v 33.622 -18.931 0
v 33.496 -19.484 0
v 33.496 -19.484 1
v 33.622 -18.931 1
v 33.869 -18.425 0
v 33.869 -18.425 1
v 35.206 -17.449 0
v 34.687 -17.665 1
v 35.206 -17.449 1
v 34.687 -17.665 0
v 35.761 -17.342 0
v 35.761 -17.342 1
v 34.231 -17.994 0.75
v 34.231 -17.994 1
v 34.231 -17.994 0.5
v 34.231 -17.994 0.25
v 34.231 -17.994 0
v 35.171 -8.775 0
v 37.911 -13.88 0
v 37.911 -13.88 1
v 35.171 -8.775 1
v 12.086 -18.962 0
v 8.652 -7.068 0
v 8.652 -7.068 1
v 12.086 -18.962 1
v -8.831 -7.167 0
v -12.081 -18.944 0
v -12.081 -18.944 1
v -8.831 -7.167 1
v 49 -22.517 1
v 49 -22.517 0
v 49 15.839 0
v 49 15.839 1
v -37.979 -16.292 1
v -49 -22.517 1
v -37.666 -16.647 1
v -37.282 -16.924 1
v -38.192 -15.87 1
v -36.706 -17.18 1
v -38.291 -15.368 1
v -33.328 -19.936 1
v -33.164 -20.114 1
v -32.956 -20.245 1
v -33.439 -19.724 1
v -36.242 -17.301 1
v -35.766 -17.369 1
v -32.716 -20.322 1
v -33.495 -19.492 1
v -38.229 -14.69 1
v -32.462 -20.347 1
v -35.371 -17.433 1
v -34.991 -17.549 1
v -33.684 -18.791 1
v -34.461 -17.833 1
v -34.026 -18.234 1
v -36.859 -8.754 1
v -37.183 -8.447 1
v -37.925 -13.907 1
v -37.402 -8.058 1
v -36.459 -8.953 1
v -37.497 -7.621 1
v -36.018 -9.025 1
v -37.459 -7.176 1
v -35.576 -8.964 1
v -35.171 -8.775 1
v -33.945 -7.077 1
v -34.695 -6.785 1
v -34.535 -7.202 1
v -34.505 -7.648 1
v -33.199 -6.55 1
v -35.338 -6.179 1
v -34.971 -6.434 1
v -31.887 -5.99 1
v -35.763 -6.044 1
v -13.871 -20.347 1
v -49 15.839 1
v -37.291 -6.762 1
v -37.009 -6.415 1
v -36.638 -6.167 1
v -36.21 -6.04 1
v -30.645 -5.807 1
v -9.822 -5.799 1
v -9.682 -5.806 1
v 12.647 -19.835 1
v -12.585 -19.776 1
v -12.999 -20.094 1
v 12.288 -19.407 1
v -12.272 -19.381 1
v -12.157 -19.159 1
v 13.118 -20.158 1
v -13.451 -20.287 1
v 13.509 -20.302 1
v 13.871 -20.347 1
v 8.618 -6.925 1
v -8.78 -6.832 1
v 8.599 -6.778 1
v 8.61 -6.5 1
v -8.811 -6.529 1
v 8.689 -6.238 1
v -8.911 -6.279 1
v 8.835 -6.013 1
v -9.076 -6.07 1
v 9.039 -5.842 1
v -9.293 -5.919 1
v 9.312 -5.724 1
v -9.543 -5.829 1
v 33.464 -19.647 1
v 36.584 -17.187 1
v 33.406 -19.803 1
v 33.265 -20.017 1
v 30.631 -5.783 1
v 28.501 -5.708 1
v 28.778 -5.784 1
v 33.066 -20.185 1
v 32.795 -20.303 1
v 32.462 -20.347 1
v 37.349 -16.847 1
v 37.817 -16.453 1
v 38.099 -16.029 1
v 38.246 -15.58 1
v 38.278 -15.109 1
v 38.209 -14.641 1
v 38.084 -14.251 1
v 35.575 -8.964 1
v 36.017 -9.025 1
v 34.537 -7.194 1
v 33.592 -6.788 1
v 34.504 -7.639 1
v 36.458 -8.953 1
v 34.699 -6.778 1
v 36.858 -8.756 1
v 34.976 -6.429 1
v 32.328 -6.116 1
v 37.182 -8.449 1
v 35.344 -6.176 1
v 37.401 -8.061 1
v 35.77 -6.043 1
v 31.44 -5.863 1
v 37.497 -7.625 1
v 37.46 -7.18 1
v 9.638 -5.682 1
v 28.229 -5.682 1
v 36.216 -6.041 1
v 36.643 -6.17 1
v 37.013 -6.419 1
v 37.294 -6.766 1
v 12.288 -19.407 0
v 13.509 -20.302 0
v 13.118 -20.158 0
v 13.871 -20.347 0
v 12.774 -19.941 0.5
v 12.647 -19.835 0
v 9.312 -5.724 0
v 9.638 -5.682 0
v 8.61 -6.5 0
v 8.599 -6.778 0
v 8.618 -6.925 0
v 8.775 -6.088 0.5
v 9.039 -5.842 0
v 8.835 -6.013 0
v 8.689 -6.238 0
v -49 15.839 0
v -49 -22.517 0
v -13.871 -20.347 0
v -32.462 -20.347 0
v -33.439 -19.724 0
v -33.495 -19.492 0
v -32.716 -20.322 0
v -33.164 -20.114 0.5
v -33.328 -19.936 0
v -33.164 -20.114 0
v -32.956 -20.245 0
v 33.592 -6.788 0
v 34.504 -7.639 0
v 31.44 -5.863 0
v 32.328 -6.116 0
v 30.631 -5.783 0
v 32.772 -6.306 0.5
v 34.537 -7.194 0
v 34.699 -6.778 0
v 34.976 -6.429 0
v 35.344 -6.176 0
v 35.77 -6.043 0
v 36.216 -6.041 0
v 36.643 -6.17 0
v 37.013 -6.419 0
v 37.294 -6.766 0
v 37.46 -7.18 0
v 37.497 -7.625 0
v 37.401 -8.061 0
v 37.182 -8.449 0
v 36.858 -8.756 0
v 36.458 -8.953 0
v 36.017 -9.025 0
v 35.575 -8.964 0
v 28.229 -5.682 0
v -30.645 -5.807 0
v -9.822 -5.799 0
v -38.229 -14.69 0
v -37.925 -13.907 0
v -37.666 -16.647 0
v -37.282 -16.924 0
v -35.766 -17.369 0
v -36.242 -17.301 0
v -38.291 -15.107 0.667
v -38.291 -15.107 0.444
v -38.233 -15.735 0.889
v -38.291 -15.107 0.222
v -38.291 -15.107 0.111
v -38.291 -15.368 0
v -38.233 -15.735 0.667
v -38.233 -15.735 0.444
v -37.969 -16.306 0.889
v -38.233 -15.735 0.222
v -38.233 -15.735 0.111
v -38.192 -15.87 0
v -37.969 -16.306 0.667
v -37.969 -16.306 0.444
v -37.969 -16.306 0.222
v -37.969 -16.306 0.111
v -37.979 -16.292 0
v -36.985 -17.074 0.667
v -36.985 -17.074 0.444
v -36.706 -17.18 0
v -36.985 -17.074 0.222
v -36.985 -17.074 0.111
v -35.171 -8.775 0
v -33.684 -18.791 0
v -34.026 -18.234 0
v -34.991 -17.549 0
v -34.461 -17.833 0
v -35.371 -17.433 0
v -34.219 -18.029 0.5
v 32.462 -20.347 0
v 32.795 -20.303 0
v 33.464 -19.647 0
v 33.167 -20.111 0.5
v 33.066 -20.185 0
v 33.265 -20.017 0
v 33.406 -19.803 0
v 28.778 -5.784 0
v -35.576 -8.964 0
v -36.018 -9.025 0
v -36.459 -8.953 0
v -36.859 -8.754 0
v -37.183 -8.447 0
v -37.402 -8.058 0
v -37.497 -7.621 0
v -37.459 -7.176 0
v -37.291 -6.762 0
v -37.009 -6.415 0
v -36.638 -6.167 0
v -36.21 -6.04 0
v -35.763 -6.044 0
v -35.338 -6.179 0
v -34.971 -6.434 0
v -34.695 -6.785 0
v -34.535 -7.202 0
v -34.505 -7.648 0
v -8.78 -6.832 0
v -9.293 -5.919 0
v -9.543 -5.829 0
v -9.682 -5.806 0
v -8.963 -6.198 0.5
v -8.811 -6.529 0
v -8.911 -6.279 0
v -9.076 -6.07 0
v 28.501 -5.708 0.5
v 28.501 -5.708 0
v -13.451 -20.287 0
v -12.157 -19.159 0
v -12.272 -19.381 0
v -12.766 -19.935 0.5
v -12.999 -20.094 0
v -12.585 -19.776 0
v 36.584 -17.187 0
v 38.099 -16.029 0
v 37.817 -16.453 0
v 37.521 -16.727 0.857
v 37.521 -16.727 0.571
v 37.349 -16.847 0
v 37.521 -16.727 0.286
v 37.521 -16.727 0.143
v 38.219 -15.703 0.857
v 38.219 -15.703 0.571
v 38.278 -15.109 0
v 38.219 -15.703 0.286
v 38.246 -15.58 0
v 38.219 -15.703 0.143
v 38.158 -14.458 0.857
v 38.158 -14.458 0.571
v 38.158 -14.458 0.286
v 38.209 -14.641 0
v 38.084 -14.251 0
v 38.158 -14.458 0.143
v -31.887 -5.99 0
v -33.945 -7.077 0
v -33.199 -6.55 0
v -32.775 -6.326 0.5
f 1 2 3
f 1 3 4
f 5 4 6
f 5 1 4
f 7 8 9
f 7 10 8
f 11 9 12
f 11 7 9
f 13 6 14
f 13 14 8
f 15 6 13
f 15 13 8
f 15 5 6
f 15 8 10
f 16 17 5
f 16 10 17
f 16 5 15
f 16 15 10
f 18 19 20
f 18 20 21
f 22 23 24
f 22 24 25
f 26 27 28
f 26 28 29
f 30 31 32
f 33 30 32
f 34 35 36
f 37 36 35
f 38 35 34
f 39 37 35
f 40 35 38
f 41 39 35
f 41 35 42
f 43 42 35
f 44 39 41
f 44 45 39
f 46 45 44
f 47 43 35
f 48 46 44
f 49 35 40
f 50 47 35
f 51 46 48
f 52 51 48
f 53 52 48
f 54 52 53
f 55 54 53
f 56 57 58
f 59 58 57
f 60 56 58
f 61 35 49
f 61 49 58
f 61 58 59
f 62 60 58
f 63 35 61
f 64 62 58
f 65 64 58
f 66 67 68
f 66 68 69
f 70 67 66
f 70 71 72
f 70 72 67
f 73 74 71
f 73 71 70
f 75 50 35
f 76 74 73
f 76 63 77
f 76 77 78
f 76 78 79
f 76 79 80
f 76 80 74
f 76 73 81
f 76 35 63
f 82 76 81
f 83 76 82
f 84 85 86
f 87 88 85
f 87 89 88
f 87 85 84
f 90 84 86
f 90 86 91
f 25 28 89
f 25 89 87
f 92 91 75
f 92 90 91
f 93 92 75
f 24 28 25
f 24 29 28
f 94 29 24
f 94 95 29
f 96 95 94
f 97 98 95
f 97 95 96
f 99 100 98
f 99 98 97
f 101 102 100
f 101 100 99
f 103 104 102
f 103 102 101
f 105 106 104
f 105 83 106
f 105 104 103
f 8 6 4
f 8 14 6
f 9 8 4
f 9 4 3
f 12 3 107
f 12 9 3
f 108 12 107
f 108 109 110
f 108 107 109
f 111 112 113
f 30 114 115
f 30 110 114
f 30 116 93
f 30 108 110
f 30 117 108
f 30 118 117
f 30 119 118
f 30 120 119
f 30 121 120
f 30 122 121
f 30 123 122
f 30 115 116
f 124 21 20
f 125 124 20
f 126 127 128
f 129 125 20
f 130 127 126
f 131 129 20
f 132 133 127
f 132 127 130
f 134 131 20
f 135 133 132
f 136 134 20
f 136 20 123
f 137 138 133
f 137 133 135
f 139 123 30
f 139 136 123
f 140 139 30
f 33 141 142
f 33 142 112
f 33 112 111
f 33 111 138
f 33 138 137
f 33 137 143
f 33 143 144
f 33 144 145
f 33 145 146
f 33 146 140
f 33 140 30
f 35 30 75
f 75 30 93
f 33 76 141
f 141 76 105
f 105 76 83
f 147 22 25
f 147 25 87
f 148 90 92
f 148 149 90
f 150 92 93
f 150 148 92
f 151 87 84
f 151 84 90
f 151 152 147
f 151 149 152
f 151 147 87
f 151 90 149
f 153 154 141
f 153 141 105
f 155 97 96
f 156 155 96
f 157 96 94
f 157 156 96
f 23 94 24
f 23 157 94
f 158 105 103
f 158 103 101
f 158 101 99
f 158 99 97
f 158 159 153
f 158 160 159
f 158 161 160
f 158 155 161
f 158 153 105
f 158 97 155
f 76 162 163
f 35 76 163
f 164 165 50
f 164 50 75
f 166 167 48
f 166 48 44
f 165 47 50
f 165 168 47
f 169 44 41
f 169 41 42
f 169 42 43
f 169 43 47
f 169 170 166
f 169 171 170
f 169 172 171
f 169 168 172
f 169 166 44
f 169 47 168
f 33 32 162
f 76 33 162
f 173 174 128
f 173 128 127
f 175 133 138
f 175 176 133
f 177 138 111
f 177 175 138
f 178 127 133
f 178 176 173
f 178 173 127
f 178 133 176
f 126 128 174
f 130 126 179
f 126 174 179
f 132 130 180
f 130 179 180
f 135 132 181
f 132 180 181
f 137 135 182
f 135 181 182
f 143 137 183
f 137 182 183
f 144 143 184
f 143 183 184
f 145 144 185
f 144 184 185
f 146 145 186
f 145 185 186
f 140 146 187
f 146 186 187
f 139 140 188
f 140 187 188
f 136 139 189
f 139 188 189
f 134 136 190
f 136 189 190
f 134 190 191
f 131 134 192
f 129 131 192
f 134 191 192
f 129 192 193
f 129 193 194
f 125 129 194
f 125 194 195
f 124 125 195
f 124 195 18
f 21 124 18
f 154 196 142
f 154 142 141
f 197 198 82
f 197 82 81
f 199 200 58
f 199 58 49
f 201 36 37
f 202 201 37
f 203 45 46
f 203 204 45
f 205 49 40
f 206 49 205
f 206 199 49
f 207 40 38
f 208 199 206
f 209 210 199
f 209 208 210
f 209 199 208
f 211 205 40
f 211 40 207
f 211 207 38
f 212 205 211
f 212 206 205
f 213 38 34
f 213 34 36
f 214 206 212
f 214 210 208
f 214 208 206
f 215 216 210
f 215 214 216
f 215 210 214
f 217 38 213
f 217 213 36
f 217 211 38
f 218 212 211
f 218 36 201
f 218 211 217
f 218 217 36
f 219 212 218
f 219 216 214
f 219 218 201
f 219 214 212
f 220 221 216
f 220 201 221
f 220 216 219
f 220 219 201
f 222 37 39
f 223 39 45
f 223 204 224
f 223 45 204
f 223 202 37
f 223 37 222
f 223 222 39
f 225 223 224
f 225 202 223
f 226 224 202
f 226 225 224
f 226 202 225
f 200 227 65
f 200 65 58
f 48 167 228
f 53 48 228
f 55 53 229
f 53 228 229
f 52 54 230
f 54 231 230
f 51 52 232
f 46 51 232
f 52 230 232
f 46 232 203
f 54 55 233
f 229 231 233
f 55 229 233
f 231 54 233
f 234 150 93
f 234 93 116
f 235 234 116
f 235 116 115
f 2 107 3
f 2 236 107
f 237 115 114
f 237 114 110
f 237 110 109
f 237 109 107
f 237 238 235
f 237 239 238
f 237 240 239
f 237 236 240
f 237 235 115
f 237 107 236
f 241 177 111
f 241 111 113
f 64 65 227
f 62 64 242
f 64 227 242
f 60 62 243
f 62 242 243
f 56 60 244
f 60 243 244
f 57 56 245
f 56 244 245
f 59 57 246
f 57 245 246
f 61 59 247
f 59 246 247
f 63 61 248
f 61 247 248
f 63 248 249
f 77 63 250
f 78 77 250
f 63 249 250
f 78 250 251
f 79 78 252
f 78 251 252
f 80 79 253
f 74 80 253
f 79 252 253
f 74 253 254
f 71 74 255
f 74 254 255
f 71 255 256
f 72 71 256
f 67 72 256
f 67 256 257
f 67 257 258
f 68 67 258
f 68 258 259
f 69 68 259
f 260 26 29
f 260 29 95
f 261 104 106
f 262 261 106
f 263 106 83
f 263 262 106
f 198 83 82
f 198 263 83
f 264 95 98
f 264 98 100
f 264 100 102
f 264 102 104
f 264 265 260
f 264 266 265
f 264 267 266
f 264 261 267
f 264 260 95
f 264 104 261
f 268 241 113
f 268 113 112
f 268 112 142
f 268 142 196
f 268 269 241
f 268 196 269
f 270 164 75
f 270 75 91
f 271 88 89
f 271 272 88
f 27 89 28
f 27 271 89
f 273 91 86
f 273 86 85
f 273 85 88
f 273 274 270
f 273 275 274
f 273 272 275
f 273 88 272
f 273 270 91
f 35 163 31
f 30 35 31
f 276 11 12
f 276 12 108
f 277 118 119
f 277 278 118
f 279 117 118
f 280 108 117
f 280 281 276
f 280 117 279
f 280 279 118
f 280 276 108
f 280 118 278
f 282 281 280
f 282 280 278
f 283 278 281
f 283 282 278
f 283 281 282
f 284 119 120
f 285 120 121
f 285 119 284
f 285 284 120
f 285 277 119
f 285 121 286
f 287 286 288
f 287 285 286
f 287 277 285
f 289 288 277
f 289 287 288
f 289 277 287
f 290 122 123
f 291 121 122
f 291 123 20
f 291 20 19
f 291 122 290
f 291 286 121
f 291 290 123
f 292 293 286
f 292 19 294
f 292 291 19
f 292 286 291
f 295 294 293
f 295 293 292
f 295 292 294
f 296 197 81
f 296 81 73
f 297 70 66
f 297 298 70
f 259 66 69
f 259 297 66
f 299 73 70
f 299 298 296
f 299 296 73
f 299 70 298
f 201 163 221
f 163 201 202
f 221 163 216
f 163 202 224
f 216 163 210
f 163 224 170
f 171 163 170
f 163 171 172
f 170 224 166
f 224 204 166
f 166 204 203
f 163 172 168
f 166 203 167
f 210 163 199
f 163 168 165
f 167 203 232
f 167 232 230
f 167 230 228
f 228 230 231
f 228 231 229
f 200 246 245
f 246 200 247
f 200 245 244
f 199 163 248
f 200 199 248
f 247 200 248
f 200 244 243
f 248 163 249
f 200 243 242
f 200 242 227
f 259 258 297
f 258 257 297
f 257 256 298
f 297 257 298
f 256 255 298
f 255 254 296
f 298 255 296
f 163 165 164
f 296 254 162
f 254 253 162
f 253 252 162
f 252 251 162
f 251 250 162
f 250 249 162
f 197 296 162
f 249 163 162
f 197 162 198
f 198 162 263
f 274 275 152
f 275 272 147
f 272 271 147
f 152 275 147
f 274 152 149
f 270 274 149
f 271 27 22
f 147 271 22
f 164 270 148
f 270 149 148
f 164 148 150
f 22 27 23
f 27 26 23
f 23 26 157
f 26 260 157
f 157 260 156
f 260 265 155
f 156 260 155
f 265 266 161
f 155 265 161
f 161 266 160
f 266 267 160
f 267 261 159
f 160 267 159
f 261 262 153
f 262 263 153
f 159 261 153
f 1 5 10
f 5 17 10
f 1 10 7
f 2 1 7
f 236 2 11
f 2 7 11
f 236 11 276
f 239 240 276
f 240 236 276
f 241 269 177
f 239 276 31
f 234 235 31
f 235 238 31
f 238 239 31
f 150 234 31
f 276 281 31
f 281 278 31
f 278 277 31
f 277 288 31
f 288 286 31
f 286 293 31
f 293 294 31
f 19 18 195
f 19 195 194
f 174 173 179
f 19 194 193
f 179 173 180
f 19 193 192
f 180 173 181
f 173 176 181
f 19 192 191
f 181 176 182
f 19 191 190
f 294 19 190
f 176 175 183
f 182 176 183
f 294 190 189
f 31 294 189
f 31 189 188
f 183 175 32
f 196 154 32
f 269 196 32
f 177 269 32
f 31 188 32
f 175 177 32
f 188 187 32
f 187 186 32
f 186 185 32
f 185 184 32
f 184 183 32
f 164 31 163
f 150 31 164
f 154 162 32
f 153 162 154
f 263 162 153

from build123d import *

# Parameters (mm, degrees)
EXTRUDE_1_DEPTH     = 1
CUT_EXTRUDE_4_DEPTH = 54.935146241
SKETCH_4_R          = 1.5
CUT_EXTRUDE_5_DEPTH = 54.935146241
CUT_EXTRUDE1_START  = -1
CUT_EXTRUDE1_DEPTH  = 1


with BuildPart() as part:
    # Эскиз1 → Бобышка-Вытянуть1 (new body)
    with BuildSketch(Plane.XY):
        Polygon((-49, 5.839183832), (-49, -22.516660498), (49, -22.516660498), (49, 5.839183832), (49, 15.839183832), (-49, 15.839183832), align=None)
    extrude(amount=EXTRUDE_1_DEPTH)

    # Эскиз2 → Вырез-Вытянуть4 (cut, through all)
    with BuildSketch(Plane(origin=(0, 0, 0), x_dir=(-1, 0, 0), z_dir=(0, 0, -1))):
        with BuildLine():
            Line((27.226146034, -9.122134253), (15.739905482, -9.122134253))
            ThreePointArc((15.739905482, -9.122134253), (15.10500819, -9.461530461), (14.917793913, -10.156681647))
            Line((14.917793913, -10.156681647), (17.442090319, -18.930924047))
            ThreePointArc((17.442090319, -18.930924047), (18.050493328, -19.909298147), (19.122649731, -20.331021695))
            Line((19.122649731, -20.331021695), (30.826843589, -20.331021695))
            ThreePointArc((30.826843589, -20.331021695), (31.459345435, -19.990005133), (31.64325008, -19.295361367))
            Line((31.64325008, -19.295361367), (29.100959308, -10.488607797))
            ThreePointArc((29.100959308, -10.488607797), (28.40806584, -9.469896887), (27.226146034, -9.122134253))
        make_face()
        with BuildLine():
            Line((-31.64325008, -19.295361367), (-29.100959308, -10.488607797))
            ThreePointArc((-29.100959308, -10.488607797), (-28.40806584, -9.469896887), (-27.226146034, -9.122134253))
            Line((-27.226146034, -9.122134253), (-15.739905482, -9.122134253))
            ThreePointArc((-15.739905482, -9.122134253), (-15.10500819, -9.461530461), (-14.917793913, -10.156681647))
            Line((-14.917793913, -10.156681647), (-17.442090319, -18.930924047))
            ThreePointArc((-17.442090319, -18.930924047), (-18.050493328, -19.909298147), (-19.122649731, -20.331021695))
            Line((-19.122649731, -20.331021695), (-30.826843589, -20.331021695))
            ThreePointArc((-30.826843589, -20.331021695), (-31.459345435, -19.990005133), (-31.64325008, -19.295361367))
        make_face()
    extrude(amount=-CUT_EXTRUDE_4_DEPTH, mode=Mode.SUBTRACT)

    # Эскиз4 → Вырез-Вытянуть5 (cut, through all)
    with BuildSketch(Plane(origin=(0, 0, 0), x_dir=(-1, 0, 0), z_dir=(0, 0, -1))):
        with Locations((36, -7.524952718)):
            Circle(SKETCH_4_R)
        with Locations((-36, -7.524952718)):
            Circle(SKETCH_4_R)
    extrude(amount=-CUT_EXTRUDE_5_DEPTH, mode=Mode.SUBTRACT)

    # Sketch3 → Cut-Extrude1 (cut)
    with BuildSketch(Plane.XY.offset(1).offset(CUT_EXTRUDE1_START)):
        with BuildLine():
            Line((8.652344227, -7.068131311), (12.085677561, -18.961546856))
            add(Edge.make_bspline(
                [(12.085677561, -18.961546856), (12.485677561, -20.347187502), (13.871318207, -20.347187502)],
                knots=[0.857071948, 0.857071948, 0.857071948, 2.427868275, 2.427868275, 2.427868275], degree=2, weights=[1, 0.707106781, 1]))
            Line((13.871318207, -20.347187502), (32.461996875, -20.347187502))
            add(Edge.make_bspline(
                [(32.461996875, -20.347187502), (33.393769403, -20.347187502), (33.496157418, -19.484255682)],
                knots=[2.427868275, 2.427868275, 2.427868275, 3.611858299, 3.611858299, 3.611858299], degree=2, weights=[1, 0.829829079, 1]))
            add(Edge.make_bspline(
                [(33.496157418, -19.484255682), (33.529743577, -19.201189685), (33.607326061, -18.923570429), (33.853252735, -18.417152493), (34.025349409, -18.183932413), (34.436238564, -17.8036127), (34.681879478, -17.649935655), (35.200024528, -17.435065661), (35.479061866, -17.369439067), (35.76148791, -17.34207634)],
                knots=[0, 0, 0, 0, 0.25, 0.25, 0.5, 0.5, 0.75, 0.75, 1, 1, 1, 1], degree=3))
            add(Edge.make_bspline(
                [(35.76148791, -17.34207634), (36.181169226, -17.301415694), (36.592378309, -17.212108423), (37.170380488, -16.959028015), (37.354968395, -16.854344533), (37.687544868, -16.599797528), (37.83830967, -16.446579579), (38.076557482, -16.101495837), (38.166209489, -15.905573827), (38.271501218, -15.499696694), (38.288800836, -15.285469364), (38.263278752, -14.867475934), (38.220734772, -14.657932914), (38.094284502, -14.258193956), (38.010543981, -14.065974434), (37.910619322, -13.879789794)],
                knots=[0, 0, 0, 0, 0.25, 0.25, 0.375, 0.375, 0.5, 0.5, 0.625, 0.625, 0.75, 0.75, 0.875, 0.875, 1, 1, 1, 1], degree=3))
            Line((37.910619322, -13.879789794), (35.170885606, -8.774980446))
            ThreePointArc((35.170885606, -8.774980446), (34.803783463, -8.429975368), (34.571610551, -7.982886756))
            ThreePointArc((34.571610551, -7.982886756), (34.527886571, -7.812845152), (34.504331156, -7.638859302))
            add(Edge.make_bspline(
                [(34.504331156, -7.638859302), (33.03670289, -5.782259548), (30.630891119, -5.783194379)],
                knots=[4.00651056, 4.00651056, 4.00651056, 5.38030343, 5.38030343, 5.38030343], degree=2, weights=[1, 0.773217832, 1]))
            Line((30.630891119, -5.783194379), (28.778313515, -5.783914238))
            add(Edge.make_bspline(
                [(28.778313515, -5.783914238), (28.498733332, -5.682490665), (28.228663541, -5.682490665)],
                knots=[5.18447533, 5.18447533, 5.18447533, 5.569460928, 5.569460928, 5.569460928], degree=2, weights=[1, 0.981530397, 1]))
            Line((28.228663541, -5.682490665), (9.637984874, -5.682490665))
            add(Edge.make_bspline(
                [(9.637984874, -5.682490665), (8.252344227, -5.682490665), (8.652344227, -7.068131311)],
                knots=[5.569460928, 5.569460928, 5.569460928, 7.140257255, 7.140257255, 7.140257255], degree=2, weights=[1, 0.707106781, 1]))
        make_face()
        with BuildLine():
            Line((-35.170885606, -8.774980446), (-37.925052204, -13.906681863))
            add(Edge.make_bspline(
                [(-37.925052204, -13.906681863), (-38.025225081, -14.093328995), (-38.109806595, -14.28778394), (-38.235924368, -14.687324932), (-38.278394681, -14.895918794), (-38.297414091, -15.212202185), (-38.296322734, -15.317469634), (-38.277441195, -15.527644209), (-38.259343447, -15.633280004), (-38.205994928, -15.836909506), (-38.170798519, -15.935630825), (-38.082894213, -16.126717018), (-38.029532599, -16.219817403), (-37.849055501, -16.479499021), (-37.698892817, -16.631115336), (-37.362837335, -16.886481906), (-37.179664999, -16.989484869), (-36.595923377, -17.242719775), (-36.186794345, -17.329699001), (-35.766265682, -17.369273893)],
                knots=[0, 0, 0, 0, 0.125, 0.125, 0.25, 0.25, 0.3125, 0.3125, 0.375, 0.375, 0.4375, 0.4375, 0.5, 0.5, 0.625, 0.625, 0.75, 0.75, 1, 1, 1, 1], degree=3))
            add(Edge.make_bspline(
                [(-33.495182661, -19.492227082), (-33.738478544, -17.560103824), (-35.766265682, -17.369273893)],
                knots=[5.81913938, 5.81913938, 5.81913938, 6.905546226, 6.905546226, 6.905546226], degree=2, weights=[1, 0.856057288, 1]))
            add(Edge.make_bspline(
                [(-33.495182661, -19.492227082), (-33.387524752, -20.347187502), (-32.461996875, -20.347187502)],
                knots=[2.677546726, 2.677546726, 2.677546726, 3.855317033, 3.855317033, 3.855317033], degree=2, weights=[1, 0.83156042, 1]))
            Line((-32.461996875, -20.347187502), (-13.871318207, -20.347187502))
            add(Edge.make_bspline(
                [(-13.871318207, -20.347187502), (-12.46794332, -20.347187502), (-12.080702928, -18.943926093)],
                knots=[3.855317033, 3.855317033, 3.855317033, 5.438830393, 5.438830393, 5.438830393], degree=2, weights=[1, 0.702596367, 1]))
            Line((-12.080702928, -18.943926093), (-8.83075434, -7.166932971))
            add(Edge.make_bspline(
                [(-8.83075434, -7.166932971), (-8.45309236, -5.798381309), (-9.82190813, -5.798913193)],
                knots=[5.438830393, 5.438830393, 5.438830393, 6.997298301, 6.997298301, 6.997298301], degree=2, weights=[1, 0.711452073, 1]))
            Line((-9.82190813, -5.798913193), (-30.645016113, -5.807004464))
            add(Edge.make_bspline(
                [(-30.645016113, -5.807004464), (-33.032902471, -5.807932329), (-34.505069218, -7.648167801)],
                knots=[0.90305787, 0.90305787, 0.90305787, 2.269113721, 2.269113721, 2.269113721], degree=2, weights=[1, 0.775665219, 1]))
            ThreePointArc((-34.505069218, -7.648167801), (-34.53118454, -7.829224215), (-34.579145022, -8.005755309))
            ThreePointArc((-34.579145022, -8.005755309), (-34.811085633, -8.43954696), (-35.170885606, -8.774980446))
        make_face()
    extrude(amount=CUT_EXTRUDE1_DEPTH, mode=Mode.SUBTRACT)


solid = part.part
